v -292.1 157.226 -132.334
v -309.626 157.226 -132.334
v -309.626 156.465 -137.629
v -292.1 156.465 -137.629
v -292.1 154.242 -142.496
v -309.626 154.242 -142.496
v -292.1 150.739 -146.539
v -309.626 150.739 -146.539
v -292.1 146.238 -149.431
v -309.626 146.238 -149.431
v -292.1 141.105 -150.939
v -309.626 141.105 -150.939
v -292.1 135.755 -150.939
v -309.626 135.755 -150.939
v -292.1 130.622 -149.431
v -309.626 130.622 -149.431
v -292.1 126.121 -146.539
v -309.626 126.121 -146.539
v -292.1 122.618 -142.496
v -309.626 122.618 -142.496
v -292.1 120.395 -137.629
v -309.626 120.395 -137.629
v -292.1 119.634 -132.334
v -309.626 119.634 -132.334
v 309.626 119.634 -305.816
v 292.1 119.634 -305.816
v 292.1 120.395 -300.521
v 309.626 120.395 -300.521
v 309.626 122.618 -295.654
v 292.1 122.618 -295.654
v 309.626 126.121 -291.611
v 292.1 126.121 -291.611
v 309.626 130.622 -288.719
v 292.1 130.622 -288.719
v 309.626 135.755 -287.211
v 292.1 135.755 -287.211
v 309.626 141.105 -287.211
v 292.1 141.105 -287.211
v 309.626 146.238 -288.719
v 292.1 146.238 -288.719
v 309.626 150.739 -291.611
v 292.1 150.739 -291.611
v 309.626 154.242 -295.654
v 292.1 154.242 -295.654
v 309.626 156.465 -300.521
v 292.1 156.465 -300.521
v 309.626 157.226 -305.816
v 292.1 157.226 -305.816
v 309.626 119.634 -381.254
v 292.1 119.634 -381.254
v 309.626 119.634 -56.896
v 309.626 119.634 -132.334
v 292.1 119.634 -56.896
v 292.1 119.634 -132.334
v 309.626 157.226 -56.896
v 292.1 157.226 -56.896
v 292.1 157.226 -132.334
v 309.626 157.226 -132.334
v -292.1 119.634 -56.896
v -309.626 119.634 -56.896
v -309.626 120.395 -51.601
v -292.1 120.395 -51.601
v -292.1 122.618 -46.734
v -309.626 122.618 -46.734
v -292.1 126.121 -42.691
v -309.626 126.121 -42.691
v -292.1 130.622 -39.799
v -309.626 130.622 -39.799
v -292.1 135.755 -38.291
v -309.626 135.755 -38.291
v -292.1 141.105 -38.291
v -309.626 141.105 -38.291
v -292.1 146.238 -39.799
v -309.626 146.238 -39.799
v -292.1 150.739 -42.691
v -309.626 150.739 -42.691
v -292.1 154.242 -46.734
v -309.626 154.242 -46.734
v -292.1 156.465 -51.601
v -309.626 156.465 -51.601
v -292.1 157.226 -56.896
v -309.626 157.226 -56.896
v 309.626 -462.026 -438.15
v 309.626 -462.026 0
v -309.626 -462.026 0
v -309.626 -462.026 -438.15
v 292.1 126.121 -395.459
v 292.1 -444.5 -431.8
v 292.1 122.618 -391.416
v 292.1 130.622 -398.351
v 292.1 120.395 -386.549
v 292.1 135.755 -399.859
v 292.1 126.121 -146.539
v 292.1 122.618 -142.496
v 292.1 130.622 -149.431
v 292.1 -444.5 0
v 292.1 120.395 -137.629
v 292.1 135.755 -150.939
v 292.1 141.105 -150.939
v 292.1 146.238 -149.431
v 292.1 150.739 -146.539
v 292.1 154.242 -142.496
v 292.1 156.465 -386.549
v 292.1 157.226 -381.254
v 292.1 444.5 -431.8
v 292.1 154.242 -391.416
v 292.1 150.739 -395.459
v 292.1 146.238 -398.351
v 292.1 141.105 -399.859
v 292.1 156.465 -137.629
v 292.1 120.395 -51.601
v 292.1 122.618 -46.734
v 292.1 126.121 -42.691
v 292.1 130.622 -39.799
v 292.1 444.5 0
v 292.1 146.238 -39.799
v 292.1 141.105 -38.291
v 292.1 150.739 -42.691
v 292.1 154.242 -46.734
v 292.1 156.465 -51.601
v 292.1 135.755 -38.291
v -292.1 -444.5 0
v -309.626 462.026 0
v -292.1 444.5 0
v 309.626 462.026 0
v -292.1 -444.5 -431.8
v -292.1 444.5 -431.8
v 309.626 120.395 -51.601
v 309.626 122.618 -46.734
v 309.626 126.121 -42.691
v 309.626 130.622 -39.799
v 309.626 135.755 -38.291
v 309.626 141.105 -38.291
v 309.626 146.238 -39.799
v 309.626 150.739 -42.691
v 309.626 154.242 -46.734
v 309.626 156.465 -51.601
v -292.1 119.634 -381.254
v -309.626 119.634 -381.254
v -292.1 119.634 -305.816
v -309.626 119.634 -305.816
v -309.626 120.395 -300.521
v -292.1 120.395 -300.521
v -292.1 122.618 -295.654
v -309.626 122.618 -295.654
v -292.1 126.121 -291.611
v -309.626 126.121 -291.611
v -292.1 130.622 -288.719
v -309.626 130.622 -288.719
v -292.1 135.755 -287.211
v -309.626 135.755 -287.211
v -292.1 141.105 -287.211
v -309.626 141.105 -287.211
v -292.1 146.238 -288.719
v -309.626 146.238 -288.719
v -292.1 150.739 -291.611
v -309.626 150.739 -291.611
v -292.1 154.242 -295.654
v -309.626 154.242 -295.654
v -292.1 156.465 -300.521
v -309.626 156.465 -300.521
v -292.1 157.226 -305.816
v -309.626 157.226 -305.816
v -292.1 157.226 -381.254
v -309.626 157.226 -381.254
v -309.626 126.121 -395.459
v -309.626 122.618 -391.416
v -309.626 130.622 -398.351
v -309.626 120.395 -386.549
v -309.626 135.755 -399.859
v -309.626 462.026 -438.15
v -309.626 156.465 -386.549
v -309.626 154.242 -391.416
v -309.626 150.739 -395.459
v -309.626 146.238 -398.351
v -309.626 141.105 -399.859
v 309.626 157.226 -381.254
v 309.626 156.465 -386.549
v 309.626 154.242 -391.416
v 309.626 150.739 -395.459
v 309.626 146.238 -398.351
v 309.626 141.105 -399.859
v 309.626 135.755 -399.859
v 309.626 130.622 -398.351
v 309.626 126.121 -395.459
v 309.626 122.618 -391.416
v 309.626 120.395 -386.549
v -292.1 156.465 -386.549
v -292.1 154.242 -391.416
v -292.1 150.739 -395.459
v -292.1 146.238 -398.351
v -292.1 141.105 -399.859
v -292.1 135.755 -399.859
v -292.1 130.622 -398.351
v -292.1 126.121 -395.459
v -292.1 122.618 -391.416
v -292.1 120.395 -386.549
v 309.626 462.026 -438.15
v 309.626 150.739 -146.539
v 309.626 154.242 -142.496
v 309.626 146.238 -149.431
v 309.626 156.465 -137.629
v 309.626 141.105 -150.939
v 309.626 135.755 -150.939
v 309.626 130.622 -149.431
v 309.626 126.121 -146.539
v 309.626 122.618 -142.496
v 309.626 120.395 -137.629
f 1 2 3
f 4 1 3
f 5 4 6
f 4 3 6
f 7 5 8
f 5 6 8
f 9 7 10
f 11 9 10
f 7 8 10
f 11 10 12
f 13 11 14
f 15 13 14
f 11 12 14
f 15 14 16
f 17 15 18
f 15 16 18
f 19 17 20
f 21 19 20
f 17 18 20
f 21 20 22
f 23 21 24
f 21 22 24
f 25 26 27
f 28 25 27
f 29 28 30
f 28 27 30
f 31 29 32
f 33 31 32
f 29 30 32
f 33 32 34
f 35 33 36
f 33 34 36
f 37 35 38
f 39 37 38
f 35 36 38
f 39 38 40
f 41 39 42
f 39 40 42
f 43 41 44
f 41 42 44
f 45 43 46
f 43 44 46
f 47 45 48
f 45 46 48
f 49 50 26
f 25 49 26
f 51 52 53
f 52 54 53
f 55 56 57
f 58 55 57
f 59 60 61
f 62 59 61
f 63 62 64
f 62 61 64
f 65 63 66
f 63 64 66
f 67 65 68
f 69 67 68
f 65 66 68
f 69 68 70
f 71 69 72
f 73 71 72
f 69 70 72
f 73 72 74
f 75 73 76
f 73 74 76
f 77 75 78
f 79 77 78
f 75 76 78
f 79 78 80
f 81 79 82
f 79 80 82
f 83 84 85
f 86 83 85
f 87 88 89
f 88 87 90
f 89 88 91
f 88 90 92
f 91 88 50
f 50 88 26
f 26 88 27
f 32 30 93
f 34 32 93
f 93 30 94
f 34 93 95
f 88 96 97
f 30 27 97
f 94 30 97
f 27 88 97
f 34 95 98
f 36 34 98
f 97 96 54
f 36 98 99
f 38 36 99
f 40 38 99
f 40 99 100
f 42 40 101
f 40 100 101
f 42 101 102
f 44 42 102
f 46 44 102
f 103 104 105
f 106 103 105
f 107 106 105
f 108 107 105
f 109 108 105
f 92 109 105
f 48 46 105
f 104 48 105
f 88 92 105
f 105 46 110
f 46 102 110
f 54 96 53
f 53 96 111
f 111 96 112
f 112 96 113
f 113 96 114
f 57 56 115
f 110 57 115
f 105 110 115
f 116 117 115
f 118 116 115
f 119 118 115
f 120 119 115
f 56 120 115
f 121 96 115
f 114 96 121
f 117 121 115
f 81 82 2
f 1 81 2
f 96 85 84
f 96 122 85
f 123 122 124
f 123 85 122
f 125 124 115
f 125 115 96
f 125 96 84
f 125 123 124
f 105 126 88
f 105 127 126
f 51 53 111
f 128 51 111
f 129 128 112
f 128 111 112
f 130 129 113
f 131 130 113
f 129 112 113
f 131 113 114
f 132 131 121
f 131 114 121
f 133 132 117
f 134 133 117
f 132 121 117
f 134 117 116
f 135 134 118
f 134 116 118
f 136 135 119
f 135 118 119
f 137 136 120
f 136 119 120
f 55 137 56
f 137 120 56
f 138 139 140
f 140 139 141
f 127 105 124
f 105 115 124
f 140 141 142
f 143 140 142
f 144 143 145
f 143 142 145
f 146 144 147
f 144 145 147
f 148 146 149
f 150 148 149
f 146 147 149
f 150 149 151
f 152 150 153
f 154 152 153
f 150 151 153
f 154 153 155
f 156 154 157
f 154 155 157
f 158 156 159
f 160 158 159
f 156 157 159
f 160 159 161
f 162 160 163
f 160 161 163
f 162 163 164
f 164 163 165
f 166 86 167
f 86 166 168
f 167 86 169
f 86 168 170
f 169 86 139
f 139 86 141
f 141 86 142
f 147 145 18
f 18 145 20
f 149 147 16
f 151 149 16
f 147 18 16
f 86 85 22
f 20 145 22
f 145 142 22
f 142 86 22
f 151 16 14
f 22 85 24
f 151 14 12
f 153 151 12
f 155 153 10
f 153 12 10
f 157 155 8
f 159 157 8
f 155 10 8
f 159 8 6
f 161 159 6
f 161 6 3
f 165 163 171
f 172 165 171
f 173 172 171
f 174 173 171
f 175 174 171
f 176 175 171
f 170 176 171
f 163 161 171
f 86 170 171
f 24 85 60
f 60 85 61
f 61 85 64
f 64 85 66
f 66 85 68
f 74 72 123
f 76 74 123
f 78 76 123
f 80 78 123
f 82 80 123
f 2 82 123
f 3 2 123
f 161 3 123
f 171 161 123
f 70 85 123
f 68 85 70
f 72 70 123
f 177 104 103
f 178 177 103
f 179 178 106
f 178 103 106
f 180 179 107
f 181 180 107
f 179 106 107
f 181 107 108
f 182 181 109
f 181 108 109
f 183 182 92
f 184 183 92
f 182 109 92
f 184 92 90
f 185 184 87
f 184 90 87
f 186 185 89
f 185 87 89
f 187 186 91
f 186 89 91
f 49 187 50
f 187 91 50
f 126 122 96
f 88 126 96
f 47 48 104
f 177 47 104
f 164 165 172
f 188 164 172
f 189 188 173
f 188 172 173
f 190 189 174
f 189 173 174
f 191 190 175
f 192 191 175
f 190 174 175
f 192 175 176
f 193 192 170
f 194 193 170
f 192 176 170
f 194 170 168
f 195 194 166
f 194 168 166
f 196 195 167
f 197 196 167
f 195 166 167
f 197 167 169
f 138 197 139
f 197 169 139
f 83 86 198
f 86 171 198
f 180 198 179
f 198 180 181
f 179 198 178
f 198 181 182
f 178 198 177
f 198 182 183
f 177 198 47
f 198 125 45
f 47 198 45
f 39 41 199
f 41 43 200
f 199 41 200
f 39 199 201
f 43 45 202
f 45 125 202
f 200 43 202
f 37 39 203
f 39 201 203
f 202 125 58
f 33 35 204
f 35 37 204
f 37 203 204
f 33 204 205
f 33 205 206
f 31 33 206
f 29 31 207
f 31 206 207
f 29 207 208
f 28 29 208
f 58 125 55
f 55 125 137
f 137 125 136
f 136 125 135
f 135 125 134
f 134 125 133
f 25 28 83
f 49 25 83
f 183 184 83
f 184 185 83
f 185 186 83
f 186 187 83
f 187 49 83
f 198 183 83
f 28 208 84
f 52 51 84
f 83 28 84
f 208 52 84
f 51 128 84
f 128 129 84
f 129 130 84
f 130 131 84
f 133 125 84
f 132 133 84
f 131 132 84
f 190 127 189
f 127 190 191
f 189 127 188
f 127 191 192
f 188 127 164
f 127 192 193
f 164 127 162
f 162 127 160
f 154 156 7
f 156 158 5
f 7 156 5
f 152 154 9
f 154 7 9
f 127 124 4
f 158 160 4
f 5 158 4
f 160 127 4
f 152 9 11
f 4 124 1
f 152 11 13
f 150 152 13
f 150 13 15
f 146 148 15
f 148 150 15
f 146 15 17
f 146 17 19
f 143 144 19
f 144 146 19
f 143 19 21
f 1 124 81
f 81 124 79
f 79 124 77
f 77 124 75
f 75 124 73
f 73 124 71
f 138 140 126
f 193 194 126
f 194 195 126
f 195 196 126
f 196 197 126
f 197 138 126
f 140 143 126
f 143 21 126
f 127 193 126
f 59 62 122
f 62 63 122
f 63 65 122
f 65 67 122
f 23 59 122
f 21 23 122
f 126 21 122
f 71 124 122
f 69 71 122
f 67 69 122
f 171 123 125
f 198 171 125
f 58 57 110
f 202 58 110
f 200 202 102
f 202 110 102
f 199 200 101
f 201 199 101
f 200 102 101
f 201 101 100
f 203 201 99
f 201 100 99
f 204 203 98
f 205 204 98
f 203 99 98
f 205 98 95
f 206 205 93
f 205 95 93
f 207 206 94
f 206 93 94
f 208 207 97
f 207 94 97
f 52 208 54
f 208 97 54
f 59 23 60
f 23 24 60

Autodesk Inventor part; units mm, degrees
ref_plane "YZ Plane" through (0, 0, 0) normal (1, 0, 0) x (0, 1, 0)
ref_plane "XZ Plane" through (0, 0, 0) normal (0, 1, 0) x (-1, 0, 0)
ref_plane "XY Plane" through (0, 0, 0) normal (0, 0, 1) x (1, 0, 0)
sketch "Sketch1" plane through (0, 0, 0) normal (0, 0, 1) x (1, 0, 0)
  line L0 (-292.1, -444.5) -> (292.1, -444.5)
  line L1 (292.1, -444.5) -> (292.1, 444.5)
  line L2 (292.1, 444.5) -> (-292.1, 444.5)
  line L3 (-292.1, 444.5) -> (-292.1, -444.5)
  line L4 (-292.1, -444.5) -> (292.1, 444.5) construction
  line L5 (292.1, -444.5) -> (-292.1, 444.5) construction
  line L6 (-309.626, 462.026) -> (309.626, 462.026)
  line L7 (309.626, 462.026) -> (309.626, -462.026)
  line L8 (309.626, -462.026) -> (-309.626, -462.026)
  line L9 (-309.626, -462.026) -> (-309.626, 462.026)
  point P0 (0, 0)
  dimension "d0" = 584.2
  dimension "d1" = 889
  dimension "d4" = 17.526
extrude "Extrusion1" add sketch "Sketch1" against normal blind 438.15 contours L3 L2 L1 L0 | L6 L7 L8 L9
extrude "Extrusion2" cut sketch "Sketch1" against normal blind 431.8 contours L3 L2 L1 L0
sketch "Sketch3" plane through (-309.626, -462.026, 0) normal (-1, 0, 0) x (0, 0, 1)
  line L0 (0, 0) -> (-438.15, 0) construction
  line L1 (-438.15, 0) -> (-438.15, 924.052) construction
  line L2 (-438.15, 924.052) -> (0, 924.052) construction
  line L3 (0, 924.052) -> (0, 0) construction
  line L4 (-38.1, 600.456) -> (-151.13, 600.456) construction
  line L5 (-56.896, 619.252) -> (-132.334, 619.252)
  line L6 (-132.334, 581.66) -> (-56.896, 581.66)
  arc A0 (-56.896, 581.66) -> (-56.896, 619.252) centre (-56.896, 600.456) ccw
  arc A1 (-132.334, 619.252) -> (-132.334, 581.66) centre (-132.334, 600.456) ccw
  line L7 (-287.02, 600.456) -> (-400.05, 600.456) construction
  line L8 (-305.816, 619.252) -> (-381.254, 619.252)
  line L9 (-381.254, 581.66) -> (-305.816, 581.66)
  arc A2 (-305.816, 581.66) -> (-305.816, 619.252) centre (-305.816, 600.456) ccw
  arc A3 (-381.254, 619.252) -> (-381.254, 581.66) centre (-381.254, 600.456) ccw
  point P0 (0, 462.026)
  point P1 (-94.615, 600.456)
  point P2 (-343.535, 600.456)
  point P3 (-38.1, 600.456)
  point P4 (-400.05, 600.456)
  dimension "d7" = 113.03
  dimension "d8" = 37.592
  dimension "d9" = 113.03
  dimension "d10" = 38.1
  dimension "d11" = 304.8
  dimension "d12" = 38.1
extrude "Extrusion3" cut sketch "Sketch3" against normal through all
equation "\"d9\" = d7"
properties part number "old battery cart" material "Wood (Birch)"
